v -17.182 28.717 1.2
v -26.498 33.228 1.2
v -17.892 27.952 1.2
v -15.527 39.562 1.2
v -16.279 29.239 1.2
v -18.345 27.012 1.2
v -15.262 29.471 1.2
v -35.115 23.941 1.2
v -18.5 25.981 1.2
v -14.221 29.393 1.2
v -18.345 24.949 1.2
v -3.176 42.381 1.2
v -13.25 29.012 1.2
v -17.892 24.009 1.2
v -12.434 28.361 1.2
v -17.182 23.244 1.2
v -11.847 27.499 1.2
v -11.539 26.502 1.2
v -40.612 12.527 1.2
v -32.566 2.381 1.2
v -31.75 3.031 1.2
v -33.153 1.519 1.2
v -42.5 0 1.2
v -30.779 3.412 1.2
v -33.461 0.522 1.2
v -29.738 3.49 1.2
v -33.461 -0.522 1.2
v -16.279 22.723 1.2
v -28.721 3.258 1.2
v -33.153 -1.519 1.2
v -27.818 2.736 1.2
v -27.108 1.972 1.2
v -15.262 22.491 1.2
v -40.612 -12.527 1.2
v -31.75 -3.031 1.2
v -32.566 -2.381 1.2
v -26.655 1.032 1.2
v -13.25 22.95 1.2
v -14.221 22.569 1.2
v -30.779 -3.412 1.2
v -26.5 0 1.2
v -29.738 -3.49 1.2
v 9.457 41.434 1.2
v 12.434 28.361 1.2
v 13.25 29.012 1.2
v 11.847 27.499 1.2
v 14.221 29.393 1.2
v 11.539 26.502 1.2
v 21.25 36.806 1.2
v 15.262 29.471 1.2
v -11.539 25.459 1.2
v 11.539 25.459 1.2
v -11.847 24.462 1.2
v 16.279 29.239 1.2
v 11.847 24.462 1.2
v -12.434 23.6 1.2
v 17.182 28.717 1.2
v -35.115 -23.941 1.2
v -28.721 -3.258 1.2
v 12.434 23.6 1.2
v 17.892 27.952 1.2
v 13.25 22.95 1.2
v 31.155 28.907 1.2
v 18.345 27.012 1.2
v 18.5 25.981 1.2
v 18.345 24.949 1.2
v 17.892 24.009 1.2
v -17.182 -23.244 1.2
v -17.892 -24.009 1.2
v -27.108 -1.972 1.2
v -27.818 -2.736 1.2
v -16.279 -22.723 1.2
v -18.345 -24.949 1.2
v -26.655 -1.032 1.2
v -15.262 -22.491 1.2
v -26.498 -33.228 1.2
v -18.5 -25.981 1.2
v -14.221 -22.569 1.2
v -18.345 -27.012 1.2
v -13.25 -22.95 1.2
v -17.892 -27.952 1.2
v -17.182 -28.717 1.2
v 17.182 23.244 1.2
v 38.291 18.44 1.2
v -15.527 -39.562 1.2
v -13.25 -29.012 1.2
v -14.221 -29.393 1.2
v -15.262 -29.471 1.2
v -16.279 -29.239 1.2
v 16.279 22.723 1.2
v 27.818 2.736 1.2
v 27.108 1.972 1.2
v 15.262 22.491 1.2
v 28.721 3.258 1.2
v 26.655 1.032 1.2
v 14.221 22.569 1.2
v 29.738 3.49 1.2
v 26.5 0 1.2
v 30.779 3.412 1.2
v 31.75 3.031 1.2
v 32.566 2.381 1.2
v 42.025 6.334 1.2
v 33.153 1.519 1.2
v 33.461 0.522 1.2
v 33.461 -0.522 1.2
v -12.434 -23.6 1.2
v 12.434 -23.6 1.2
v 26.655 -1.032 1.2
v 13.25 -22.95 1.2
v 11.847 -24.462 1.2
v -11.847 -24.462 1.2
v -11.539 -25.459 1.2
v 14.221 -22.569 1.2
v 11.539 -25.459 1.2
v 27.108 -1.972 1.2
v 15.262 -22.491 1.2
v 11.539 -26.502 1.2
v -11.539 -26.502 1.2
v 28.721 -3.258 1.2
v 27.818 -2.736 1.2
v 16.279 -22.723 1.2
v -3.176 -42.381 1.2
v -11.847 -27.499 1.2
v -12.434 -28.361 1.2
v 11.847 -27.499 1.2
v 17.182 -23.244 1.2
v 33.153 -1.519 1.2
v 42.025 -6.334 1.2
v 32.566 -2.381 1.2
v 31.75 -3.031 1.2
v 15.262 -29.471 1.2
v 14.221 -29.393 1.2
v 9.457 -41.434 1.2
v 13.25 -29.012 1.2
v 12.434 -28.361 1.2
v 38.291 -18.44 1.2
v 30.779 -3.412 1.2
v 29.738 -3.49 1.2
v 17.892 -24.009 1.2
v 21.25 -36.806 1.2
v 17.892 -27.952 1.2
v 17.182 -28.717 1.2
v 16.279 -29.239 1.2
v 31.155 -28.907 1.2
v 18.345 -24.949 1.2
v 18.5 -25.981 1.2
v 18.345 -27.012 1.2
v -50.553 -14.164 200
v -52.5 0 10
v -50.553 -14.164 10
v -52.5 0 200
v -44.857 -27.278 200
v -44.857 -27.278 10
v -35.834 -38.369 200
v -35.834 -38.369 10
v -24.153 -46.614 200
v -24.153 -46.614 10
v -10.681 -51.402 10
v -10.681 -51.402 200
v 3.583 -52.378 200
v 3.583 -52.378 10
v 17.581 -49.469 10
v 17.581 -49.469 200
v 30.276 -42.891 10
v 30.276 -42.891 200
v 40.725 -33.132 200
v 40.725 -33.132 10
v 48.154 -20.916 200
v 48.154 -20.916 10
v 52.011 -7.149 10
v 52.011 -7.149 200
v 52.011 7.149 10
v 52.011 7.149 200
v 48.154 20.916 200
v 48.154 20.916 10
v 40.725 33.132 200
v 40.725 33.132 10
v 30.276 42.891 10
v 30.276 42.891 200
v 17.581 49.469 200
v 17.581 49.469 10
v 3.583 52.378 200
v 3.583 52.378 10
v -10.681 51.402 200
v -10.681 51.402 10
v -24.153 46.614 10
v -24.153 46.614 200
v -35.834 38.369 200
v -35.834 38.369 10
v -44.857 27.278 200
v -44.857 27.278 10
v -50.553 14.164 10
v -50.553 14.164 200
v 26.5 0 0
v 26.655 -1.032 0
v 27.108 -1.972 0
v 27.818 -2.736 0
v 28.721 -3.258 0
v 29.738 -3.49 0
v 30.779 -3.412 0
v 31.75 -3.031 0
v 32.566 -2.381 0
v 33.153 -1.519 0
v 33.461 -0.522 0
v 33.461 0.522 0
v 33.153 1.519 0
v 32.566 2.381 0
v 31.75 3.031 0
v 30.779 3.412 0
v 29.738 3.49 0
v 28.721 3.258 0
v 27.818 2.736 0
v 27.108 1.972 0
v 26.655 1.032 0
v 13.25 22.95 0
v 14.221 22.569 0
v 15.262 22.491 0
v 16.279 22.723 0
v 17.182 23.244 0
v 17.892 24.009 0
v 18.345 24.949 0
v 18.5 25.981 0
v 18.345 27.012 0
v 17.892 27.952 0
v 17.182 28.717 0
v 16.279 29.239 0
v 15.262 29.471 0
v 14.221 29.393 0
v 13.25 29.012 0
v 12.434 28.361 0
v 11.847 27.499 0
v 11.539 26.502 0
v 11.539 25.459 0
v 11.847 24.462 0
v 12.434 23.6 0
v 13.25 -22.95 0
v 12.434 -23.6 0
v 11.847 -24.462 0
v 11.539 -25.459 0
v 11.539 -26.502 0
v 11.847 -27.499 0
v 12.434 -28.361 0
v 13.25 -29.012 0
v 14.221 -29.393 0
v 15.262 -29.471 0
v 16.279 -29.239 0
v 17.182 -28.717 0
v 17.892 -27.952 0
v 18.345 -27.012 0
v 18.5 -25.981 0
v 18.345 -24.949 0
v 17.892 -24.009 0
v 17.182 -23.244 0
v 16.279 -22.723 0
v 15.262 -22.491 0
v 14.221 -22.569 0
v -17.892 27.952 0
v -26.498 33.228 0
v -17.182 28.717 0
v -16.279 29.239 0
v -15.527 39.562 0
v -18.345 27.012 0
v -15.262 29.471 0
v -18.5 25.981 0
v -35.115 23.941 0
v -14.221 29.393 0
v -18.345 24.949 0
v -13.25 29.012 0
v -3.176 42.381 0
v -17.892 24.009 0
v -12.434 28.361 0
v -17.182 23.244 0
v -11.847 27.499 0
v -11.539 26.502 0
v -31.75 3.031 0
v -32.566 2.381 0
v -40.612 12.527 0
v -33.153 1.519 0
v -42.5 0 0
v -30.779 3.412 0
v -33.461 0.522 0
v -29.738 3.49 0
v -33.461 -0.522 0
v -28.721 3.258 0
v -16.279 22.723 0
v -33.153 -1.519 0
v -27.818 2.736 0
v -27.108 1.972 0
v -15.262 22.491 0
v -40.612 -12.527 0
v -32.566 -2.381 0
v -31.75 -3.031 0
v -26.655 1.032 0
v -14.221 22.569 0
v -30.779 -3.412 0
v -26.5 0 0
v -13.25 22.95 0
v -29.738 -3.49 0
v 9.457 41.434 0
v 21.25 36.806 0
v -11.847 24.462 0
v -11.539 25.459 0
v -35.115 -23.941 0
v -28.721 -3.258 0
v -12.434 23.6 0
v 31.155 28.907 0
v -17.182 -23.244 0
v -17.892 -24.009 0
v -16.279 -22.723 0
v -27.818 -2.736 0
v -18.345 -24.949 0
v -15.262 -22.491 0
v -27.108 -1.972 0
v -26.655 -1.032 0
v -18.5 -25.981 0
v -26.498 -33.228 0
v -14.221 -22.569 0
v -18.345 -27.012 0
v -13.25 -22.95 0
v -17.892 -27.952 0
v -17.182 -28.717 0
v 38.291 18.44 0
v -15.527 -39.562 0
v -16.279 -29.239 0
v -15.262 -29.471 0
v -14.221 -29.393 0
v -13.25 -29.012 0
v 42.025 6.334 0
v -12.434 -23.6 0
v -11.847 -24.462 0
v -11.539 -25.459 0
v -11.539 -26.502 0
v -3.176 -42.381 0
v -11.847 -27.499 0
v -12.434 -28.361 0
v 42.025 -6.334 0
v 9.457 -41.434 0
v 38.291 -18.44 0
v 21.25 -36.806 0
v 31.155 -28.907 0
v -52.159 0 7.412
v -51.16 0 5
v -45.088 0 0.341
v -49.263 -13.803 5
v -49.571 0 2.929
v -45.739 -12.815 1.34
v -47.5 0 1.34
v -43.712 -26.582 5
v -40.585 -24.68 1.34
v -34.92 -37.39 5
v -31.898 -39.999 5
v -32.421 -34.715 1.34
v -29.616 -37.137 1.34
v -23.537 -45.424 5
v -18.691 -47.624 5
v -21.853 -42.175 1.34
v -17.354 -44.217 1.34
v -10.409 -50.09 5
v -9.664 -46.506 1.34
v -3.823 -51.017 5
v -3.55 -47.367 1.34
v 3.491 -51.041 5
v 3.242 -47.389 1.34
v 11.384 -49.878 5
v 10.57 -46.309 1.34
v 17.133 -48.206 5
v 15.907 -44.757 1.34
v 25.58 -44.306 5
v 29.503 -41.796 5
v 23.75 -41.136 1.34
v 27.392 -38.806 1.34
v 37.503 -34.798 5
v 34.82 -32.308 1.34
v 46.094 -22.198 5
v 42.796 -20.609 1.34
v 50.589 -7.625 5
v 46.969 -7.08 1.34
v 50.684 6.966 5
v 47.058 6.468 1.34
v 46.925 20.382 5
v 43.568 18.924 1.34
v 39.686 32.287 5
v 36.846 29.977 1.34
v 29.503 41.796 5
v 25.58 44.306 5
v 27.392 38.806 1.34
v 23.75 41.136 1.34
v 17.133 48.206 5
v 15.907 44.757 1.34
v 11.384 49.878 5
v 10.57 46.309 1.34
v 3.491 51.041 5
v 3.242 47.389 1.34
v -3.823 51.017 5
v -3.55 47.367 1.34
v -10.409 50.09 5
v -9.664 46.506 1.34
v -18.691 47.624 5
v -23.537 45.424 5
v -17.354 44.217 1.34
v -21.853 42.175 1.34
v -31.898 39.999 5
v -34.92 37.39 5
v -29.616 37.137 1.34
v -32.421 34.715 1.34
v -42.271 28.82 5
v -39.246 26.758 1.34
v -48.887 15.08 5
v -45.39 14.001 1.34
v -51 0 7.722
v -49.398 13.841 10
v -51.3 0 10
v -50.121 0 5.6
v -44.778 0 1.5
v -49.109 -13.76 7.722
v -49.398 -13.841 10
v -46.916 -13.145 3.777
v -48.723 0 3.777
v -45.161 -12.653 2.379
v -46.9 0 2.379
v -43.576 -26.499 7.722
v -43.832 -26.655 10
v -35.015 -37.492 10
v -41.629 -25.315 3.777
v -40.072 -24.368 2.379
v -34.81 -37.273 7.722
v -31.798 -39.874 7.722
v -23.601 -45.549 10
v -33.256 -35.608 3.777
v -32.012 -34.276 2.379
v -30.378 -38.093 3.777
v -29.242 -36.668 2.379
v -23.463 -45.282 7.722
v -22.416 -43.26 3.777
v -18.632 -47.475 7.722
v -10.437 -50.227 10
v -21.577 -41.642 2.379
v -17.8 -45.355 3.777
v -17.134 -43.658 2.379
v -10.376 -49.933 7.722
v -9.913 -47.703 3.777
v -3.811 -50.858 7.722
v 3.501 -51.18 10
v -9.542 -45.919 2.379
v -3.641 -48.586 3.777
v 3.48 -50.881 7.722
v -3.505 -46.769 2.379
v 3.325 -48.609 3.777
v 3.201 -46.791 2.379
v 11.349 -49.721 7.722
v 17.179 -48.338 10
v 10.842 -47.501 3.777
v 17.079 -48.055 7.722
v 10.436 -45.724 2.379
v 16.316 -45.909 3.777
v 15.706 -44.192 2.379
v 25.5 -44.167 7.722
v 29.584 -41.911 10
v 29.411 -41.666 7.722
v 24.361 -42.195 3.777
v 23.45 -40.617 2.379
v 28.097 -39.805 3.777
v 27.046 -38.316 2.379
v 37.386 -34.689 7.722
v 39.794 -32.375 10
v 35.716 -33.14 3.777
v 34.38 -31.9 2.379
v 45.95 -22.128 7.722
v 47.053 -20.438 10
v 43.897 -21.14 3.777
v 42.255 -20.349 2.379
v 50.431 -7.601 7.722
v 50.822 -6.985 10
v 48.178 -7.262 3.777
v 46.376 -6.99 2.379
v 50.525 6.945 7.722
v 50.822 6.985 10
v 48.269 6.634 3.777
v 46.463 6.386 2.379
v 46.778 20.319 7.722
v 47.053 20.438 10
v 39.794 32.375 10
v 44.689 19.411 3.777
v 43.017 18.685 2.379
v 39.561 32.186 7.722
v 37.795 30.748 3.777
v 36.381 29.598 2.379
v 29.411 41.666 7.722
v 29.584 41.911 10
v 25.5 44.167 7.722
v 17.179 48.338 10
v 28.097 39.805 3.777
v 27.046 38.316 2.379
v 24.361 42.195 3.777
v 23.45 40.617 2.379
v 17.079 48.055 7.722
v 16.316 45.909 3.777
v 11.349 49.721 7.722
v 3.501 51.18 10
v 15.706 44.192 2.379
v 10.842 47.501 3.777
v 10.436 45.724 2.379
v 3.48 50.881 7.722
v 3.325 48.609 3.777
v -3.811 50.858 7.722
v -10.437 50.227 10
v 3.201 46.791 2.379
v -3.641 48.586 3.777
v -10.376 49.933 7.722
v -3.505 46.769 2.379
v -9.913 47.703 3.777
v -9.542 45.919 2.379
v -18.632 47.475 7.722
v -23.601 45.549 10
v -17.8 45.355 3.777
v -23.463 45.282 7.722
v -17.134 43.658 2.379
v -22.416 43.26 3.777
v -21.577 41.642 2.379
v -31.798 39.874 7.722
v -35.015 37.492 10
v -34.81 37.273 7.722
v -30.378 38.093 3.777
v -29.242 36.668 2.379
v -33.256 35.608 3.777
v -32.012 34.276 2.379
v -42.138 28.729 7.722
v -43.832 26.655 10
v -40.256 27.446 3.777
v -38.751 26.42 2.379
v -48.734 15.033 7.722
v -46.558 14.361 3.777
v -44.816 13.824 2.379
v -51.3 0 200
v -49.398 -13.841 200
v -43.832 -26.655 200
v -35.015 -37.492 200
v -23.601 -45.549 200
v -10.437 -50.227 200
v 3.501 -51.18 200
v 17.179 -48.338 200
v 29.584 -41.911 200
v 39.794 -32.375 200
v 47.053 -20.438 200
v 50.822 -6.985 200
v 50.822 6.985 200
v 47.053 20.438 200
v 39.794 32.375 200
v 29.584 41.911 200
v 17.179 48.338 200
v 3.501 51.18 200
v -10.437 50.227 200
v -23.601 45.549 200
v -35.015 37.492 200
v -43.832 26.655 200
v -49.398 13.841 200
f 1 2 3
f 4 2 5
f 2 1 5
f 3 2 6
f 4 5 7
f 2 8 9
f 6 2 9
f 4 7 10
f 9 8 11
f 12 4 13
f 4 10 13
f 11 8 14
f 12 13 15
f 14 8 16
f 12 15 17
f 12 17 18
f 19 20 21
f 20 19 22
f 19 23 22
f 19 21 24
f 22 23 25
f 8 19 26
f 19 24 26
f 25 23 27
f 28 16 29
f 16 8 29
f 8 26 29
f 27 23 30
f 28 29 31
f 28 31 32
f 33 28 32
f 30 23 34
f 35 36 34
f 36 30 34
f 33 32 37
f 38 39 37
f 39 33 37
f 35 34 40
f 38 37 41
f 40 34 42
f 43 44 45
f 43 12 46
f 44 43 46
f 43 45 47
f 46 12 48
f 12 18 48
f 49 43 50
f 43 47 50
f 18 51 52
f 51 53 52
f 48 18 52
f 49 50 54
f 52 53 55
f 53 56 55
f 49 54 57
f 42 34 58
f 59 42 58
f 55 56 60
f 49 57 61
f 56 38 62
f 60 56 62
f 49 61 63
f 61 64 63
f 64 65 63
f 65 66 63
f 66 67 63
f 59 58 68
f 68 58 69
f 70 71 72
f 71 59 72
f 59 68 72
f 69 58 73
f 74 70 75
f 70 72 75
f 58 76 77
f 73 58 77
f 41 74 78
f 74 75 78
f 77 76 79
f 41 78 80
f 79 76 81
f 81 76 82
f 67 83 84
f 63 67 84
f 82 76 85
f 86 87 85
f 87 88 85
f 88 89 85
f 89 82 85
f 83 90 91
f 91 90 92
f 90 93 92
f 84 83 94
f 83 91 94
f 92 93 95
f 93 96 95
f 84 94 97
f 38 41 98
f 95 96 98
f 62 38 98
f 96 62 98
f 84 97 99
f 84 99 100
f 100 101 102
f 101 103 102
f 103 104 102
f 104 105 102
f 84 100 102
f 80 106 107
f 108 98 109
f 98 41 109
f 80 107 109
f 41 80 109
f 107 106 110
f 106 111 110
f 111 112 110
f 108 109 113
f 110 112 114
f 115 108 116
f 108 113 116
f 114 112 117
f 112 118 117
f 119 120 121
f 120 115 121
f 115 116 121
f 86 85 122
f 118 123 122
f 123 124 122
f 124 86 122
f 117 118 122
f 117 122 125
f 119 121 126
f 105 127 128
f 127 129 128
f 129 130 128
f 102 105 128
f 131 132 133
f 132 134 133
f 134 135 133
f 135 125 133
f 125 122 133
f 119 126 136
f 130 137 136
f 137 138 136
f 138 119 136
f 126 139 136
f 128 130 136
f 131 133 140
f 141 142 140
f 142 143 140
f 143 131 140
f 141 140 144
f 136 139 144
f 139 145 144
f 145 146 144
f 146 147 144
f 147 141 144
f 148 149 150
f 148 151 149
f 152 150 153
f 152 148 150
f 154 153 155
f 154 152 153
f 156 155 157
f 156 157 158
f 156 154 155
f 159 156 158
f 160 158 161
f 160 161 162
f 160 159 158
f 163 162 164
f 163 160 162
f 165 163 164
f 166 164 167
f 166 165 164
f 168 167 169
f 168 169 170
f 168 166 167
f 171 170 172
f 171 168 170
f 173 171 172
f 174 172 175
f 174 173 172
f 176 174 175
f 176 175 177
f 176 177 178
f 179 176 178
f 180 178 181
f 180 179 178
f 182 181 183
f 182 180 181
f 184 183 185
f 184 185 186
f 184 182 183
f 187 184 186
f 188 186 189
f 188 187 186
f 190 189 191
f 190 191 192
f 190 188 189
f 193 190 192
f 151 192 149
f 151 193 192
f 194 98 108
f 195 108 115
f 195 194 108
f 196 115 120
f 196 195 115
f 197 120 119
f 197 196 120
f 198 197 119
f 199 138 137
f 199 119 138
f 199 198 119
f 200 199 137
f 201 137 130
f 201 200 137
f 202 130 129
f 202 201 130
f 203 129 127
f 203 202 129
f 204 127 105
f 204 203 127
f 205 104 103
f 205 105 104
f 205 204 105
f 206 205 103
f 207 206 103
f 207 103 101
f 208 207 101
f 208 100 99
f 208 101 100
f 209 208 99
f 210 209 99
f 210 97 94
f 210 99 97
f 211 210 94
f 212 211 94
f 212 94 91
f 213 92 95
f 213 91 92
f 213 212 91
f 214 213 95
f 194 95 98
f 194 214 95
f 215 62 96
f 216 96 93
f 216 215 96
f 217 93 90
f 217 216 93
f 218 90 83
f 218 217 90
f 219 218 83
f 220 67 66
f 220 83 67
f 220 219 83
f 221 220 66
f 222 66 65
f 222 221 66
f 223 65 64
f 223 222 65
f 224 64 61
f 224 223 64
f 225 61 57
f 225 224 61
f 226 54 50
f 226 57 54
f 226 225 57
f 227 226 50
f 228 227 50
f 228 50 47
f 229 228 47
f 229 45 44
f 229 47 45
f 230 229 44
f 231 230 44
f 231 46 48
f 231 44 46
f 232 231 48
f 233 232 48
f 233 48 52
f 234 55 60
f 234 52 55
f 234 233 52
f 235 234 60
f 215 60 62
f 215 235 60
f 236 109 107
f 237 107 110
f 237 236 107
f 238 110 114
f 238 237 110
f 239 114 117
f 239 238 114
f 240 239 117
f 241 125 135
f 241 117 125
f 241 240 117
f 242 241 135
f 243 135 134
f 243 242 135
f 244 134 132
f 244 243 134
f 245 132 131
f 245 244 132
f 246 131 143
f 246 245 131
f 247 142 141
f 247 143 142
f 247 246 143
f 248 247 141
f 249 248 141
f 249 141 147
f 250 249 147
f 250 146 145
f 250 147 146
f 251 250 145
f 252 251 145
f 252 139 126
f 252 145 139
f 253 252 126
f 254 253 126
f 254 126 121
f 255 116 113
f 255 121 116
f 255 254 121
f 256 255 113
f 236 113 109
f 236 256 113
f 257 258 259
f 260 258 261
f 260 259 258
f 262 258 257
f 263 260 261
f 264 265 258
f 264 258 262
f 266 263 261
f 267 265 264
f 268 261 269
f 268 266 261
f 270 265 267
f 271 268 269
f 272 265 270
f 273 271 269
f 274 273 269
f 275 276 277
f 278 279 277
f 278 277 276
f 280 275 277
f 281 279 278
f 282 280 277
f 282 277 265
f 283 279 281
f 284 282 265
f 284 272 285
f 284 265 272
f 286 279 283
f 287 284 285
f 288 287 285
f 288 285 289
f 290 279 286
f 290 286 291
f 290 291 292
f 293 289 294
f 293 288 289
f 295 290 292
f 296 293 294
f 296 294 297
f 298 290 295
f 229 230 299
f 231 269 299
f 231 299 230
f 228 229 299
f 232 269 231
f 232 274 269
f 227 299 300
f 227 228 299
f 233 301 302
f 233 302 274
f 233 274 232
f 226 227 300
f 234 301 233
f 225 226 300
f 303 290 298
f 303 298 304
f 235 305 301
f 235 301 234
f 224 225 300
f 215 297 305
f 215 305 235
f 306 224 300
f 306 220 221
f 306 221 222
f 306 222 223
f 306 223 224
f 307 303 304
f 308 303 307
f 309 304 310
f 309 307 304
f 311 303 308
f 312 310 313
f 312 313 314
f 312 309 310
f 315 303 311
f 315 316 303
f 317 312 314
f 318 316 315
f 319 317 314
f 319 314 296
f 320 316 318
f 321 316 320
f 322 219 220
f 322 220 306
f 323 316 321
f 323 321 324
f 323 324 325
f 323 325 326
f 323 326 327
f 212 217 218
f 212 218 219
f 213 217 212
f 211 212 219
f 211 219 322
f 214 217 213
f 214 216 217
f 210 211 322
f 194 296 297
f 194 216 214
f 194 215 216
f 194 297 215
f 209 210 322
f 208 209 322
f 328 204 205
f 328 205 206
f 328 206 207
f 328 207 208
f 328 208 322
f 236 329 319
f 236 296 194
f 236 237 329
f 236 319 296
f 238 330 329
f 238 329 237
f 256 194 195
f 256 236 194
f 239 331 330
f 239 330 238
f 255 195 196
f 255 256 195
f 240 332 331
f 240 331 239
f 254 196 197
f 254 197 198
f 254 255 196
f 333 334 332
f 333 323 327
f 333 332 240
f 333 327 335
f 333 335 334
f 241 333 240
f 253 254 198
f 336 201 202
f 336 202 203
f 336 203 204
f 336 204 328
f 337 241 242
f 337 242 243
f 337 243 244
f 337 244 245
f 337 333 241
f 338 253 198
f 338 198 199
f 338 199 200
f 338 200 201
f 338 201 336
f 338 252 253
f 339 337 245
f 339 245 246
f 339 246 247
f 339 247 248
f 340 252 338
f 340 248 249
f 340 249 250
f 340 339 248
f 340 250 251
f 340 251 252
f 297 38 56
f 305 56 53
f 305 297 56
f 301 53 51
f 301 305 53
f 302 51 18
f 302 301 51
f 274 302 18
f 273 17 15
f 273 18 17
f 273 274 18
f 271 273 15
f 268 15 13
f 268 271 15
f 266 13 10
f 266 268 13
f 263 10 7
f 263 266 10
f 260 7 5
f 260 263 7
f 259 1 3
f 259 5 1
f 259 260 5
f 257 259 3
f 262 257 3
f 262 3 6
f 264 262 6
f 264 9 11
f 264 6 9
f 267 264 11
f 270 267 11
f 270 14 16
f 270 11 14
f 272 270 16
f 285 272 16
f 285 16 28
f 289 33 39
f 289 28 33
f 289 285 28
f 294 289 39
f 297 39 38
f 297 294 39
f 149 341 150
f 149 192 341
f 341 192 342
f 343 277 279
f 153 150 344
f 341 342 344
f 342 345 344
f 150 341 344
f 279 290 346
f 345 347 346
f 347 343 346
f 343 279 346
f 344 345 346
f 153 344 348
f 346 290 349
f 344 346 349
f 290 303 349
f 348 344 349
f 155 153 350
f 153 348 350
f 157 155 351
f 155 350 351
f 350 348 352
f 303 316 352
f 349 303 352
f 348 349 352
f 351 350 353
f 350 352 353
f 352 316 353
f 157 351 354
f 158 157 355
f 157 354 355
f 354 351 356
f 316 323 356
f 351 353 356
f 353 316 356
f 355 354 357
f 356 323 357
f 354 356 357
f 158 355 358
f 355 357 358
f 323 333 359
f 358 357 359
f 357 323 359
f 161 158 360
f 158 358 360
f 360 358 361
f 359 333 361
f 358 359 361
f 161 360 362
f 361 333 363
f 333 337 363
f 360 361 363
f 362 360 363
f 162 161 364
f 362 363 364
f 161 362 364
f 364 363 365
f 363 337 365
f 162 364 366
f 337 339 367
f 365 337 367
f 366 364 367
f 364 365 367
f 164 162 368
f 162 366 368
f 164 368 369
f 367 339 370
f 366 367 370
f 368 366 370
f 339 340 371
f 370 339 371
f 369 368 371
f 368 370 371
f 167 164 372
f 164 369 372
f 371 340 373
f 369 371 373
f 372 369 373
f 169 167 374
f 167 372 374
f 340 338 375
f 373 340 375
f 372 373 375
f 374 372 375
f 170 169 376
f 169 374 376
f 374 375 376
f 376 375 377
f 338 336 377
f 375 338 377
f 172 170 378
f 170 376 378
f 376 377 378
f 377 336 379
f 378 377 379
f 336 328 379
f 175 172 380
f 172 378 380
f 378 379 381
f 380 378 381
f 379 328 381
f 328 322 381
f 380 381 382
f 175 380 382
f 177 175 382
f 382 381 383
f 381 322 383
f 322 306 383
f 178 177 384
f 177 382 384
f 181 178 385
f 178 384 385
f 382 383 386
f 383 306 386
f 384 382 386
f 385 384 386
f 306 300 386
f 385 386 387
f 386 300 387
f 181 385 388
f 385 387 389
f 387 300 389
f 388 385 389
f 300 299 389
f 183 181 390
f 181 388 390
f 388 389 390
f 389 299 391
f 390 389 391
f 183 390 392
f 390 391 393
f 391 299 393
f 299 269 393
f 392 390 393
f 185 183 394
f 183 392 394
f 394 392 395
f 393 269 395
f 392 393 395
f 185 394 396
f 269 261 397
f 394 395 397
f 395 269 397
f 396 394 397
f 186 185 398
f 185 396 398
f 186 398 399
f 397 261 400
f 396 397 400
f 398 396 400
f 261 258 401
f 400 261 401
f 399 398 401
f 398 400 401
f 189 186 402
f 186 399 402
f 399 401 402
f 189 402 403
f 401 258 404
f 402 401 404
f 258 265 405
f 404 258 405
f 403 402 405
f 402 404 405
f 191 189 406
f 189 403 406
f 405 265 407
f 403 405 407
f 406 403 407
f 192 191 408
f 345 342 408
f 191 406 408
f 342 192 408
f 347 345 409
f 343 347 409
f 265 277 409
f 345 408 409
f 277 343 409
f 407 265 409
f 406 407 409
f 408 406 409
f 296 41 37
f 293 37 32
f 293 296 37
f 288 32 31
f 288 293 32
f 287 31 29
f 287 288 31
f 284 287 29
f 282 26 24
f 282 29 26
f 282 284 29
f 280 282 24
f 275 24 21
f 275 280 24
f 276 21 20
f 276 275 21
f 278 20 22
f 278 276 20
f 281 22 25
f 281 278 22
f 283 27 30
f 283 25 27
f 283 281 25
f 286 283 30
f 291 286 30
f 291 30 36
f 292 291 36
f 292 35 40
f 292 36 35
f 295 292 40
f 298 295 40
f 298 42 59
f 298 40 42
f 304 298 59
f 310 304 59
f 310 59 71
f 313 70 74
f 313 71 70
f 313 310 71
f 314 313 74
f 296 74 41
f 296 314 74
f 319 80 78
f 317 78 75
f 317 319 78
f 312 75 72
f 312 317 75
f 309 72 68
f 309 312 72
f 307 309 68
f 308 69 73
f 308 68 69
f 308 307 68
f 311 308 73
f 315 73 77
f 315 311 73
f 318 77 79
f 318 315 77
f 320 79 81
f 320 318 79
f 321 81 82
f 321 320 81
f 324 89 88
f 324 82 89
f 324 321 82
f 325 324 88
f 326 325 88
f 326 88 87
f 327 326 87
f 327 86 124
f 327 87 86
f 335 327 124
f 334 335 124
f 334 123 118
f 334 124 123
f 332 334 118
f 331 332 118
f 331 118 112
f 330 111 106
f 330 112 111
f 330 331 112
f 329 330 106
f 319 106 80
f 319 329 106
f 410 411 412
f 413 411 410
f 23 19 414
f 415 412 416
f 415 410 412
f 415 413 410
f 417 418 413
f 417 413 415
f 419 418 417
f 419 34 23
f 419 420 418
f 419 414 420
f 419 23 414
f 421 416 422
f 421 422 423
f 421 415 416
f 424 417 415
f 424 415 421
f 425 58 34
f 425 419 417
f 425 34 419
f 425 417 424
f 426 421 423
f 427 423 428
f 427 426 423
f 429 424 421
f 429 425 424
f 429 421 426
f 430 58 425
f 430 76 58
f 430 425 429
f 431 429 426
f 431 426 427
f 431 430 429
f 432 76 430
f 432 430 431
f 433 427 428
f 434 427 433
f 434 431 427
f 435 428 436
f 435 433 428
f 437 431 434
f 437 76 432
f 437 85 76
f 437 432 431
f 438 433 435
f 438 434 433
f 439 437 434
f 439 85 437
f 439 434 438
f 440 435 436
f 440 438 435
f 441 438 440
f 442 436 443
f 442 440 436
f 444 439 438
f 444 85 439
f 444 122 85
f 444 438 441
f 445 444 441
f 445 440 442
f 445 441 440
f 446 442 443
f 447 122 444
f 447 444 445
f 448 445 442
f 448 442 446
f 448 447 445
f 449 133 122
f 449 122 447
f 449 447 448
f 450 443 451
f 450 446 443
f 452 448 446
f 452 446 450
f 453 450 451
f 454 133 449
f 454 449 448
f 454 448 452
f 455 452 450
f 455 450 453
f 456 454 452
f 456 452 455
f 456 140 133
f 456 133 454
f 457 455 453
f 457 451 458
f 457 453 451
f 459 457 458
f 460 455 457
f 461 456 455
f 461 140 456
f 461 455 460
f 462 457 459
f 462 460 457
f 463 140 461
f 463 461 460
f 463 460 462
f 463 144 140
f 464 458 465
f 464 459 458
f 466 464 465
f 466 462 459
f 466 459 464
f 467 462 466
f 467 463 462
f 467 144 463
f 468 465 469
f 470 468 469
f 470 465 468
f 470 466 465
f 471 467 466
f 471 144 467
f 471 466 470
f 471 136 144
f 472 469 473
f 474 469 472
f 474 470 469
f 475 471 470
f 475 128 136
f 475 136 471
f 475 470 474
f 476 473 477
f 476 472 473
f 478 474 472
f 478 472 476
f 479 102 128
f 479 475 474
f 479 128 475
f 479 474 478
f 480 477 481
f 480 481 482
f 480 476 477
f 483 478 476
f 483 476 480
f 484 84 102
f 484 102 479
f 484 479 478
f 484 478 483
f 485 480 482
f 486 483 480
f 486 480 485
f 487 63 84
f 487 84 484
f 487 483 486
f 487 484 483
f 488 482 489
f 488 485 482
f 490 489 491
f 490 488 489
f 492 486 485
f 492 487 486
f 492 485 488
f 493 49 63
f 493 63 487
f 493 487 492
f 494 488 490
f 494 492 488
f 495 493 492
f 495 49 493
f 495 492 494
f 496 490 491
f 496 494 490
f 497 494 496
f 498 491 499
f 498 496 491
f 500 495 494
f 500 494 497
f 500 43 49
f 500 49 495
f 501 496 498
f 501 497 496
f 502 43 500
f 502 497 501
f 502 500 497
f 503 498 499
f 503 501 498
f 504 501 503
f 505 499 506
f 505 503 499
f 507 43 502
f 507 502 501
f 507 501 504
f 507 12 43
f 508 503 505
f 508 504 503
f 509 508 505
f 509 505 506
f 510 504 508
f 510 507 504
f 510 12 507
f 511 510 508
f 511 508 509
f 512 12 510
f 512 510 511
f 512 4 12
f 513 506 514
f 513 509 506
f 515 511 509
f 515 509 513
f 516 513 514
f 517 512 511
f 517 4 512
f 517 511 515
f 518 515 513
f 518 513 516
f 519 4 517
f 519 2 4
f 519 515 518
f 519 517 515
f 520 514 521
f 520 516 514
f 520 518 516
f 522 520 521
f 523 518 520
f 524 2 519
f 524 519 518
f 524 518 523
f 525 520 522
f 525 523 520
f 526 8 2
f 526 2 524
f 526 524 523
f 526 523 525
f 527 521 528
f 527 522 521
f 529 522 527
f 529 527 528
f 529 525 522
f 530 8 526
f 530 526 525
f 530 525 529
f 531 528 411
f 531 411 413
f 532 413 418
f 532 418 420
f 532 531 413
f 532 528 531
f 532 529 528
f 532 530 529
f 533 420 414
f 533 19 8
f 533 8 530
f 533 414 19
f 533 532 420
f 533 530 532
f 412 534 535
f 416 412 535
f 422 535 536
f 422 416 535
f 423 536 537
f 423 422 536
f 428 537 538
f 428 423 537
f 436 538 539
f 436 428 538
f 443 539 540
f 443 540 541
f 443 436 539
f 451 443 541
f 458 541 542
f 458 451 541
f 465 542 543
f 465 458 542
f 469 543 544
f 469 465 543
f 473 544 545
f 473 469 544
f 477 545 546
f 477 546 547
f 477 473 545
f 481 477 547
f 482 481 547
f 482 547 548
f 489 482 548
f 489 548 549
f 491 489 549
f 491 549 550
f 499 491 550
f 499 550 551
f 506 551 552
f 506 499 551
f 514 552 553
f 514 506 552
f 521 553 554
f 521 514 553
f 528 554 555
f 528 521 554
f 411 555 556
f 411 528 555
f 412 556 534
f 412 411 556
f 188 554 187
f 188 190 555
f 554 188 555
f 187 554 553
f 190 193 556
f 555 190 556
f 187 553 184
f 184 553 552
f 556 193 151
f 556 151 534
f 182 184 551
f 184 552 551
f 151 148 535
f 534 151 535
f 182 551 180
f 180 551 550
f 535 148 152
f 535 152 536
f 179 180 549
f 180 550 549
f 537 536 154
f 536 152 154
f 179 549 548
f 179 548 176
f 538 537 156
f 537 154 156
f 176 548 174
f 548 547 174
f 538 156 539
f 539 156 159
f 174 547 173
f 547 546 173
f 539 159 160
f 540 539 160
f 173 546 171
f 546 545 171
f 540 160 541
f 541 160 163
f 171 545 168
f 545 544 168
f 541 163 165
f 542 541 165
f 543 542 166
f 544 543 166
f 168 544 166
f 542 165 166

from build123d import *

# Parameters (mm, degrees)
SKETCH001_R        = 3.5
POCKET_DEPTH       = 698.197748
POLARPATTERN_COUNT = 6


with BuildPart() as part:
    # Sketch → Revolution (revolve)
    with BuildSketch(Plane.XZ):
        with BuildLine():
            Line((0, 0), (-42.5, 0))
            ThreePointArc((-52.5, 10), (-49.571068, 2.928932), (-42.5, 0))
            Line((-52.5, 10), (-52.5, 200))
            Line((-51.3, 200), (-52.5, 200))
            Line((-51.3, 200), (-51.3, 10))
            ThreePointArc((-51.3, 10), (-48.72254, 3.77746), (-42.5, 1.2))
            Line((0, 1.2), (-42.5, 1.2))
            Line((0, 1.2), (0, 0))
        make_face()
    revolve(axis=Axis((0, 0, 0), (0, 0, 1)))

    # Sketch001 → Pocket (cut, through all)
    with BuildSketch(Plane.XY):
        with Locations((-30, 0)):
            Circle(SKETCH001_R)
    pocket = extrude(amount=POCKET_DEPTH, mode=Mode.SUBTRACT)

    # PolarPattern: Pocket ×6 about axis
    polarpattern_axis = Axis((0, 0, 0), (0, 0, 1))
    for i in range(1, POLARPATTERN_COUNT):
        add(pocket.rotate(polarpattern_axis, i * 360 / POLARPATTERN_COUNT), mode=Mode.SUBTRACT)


solid = part.part
